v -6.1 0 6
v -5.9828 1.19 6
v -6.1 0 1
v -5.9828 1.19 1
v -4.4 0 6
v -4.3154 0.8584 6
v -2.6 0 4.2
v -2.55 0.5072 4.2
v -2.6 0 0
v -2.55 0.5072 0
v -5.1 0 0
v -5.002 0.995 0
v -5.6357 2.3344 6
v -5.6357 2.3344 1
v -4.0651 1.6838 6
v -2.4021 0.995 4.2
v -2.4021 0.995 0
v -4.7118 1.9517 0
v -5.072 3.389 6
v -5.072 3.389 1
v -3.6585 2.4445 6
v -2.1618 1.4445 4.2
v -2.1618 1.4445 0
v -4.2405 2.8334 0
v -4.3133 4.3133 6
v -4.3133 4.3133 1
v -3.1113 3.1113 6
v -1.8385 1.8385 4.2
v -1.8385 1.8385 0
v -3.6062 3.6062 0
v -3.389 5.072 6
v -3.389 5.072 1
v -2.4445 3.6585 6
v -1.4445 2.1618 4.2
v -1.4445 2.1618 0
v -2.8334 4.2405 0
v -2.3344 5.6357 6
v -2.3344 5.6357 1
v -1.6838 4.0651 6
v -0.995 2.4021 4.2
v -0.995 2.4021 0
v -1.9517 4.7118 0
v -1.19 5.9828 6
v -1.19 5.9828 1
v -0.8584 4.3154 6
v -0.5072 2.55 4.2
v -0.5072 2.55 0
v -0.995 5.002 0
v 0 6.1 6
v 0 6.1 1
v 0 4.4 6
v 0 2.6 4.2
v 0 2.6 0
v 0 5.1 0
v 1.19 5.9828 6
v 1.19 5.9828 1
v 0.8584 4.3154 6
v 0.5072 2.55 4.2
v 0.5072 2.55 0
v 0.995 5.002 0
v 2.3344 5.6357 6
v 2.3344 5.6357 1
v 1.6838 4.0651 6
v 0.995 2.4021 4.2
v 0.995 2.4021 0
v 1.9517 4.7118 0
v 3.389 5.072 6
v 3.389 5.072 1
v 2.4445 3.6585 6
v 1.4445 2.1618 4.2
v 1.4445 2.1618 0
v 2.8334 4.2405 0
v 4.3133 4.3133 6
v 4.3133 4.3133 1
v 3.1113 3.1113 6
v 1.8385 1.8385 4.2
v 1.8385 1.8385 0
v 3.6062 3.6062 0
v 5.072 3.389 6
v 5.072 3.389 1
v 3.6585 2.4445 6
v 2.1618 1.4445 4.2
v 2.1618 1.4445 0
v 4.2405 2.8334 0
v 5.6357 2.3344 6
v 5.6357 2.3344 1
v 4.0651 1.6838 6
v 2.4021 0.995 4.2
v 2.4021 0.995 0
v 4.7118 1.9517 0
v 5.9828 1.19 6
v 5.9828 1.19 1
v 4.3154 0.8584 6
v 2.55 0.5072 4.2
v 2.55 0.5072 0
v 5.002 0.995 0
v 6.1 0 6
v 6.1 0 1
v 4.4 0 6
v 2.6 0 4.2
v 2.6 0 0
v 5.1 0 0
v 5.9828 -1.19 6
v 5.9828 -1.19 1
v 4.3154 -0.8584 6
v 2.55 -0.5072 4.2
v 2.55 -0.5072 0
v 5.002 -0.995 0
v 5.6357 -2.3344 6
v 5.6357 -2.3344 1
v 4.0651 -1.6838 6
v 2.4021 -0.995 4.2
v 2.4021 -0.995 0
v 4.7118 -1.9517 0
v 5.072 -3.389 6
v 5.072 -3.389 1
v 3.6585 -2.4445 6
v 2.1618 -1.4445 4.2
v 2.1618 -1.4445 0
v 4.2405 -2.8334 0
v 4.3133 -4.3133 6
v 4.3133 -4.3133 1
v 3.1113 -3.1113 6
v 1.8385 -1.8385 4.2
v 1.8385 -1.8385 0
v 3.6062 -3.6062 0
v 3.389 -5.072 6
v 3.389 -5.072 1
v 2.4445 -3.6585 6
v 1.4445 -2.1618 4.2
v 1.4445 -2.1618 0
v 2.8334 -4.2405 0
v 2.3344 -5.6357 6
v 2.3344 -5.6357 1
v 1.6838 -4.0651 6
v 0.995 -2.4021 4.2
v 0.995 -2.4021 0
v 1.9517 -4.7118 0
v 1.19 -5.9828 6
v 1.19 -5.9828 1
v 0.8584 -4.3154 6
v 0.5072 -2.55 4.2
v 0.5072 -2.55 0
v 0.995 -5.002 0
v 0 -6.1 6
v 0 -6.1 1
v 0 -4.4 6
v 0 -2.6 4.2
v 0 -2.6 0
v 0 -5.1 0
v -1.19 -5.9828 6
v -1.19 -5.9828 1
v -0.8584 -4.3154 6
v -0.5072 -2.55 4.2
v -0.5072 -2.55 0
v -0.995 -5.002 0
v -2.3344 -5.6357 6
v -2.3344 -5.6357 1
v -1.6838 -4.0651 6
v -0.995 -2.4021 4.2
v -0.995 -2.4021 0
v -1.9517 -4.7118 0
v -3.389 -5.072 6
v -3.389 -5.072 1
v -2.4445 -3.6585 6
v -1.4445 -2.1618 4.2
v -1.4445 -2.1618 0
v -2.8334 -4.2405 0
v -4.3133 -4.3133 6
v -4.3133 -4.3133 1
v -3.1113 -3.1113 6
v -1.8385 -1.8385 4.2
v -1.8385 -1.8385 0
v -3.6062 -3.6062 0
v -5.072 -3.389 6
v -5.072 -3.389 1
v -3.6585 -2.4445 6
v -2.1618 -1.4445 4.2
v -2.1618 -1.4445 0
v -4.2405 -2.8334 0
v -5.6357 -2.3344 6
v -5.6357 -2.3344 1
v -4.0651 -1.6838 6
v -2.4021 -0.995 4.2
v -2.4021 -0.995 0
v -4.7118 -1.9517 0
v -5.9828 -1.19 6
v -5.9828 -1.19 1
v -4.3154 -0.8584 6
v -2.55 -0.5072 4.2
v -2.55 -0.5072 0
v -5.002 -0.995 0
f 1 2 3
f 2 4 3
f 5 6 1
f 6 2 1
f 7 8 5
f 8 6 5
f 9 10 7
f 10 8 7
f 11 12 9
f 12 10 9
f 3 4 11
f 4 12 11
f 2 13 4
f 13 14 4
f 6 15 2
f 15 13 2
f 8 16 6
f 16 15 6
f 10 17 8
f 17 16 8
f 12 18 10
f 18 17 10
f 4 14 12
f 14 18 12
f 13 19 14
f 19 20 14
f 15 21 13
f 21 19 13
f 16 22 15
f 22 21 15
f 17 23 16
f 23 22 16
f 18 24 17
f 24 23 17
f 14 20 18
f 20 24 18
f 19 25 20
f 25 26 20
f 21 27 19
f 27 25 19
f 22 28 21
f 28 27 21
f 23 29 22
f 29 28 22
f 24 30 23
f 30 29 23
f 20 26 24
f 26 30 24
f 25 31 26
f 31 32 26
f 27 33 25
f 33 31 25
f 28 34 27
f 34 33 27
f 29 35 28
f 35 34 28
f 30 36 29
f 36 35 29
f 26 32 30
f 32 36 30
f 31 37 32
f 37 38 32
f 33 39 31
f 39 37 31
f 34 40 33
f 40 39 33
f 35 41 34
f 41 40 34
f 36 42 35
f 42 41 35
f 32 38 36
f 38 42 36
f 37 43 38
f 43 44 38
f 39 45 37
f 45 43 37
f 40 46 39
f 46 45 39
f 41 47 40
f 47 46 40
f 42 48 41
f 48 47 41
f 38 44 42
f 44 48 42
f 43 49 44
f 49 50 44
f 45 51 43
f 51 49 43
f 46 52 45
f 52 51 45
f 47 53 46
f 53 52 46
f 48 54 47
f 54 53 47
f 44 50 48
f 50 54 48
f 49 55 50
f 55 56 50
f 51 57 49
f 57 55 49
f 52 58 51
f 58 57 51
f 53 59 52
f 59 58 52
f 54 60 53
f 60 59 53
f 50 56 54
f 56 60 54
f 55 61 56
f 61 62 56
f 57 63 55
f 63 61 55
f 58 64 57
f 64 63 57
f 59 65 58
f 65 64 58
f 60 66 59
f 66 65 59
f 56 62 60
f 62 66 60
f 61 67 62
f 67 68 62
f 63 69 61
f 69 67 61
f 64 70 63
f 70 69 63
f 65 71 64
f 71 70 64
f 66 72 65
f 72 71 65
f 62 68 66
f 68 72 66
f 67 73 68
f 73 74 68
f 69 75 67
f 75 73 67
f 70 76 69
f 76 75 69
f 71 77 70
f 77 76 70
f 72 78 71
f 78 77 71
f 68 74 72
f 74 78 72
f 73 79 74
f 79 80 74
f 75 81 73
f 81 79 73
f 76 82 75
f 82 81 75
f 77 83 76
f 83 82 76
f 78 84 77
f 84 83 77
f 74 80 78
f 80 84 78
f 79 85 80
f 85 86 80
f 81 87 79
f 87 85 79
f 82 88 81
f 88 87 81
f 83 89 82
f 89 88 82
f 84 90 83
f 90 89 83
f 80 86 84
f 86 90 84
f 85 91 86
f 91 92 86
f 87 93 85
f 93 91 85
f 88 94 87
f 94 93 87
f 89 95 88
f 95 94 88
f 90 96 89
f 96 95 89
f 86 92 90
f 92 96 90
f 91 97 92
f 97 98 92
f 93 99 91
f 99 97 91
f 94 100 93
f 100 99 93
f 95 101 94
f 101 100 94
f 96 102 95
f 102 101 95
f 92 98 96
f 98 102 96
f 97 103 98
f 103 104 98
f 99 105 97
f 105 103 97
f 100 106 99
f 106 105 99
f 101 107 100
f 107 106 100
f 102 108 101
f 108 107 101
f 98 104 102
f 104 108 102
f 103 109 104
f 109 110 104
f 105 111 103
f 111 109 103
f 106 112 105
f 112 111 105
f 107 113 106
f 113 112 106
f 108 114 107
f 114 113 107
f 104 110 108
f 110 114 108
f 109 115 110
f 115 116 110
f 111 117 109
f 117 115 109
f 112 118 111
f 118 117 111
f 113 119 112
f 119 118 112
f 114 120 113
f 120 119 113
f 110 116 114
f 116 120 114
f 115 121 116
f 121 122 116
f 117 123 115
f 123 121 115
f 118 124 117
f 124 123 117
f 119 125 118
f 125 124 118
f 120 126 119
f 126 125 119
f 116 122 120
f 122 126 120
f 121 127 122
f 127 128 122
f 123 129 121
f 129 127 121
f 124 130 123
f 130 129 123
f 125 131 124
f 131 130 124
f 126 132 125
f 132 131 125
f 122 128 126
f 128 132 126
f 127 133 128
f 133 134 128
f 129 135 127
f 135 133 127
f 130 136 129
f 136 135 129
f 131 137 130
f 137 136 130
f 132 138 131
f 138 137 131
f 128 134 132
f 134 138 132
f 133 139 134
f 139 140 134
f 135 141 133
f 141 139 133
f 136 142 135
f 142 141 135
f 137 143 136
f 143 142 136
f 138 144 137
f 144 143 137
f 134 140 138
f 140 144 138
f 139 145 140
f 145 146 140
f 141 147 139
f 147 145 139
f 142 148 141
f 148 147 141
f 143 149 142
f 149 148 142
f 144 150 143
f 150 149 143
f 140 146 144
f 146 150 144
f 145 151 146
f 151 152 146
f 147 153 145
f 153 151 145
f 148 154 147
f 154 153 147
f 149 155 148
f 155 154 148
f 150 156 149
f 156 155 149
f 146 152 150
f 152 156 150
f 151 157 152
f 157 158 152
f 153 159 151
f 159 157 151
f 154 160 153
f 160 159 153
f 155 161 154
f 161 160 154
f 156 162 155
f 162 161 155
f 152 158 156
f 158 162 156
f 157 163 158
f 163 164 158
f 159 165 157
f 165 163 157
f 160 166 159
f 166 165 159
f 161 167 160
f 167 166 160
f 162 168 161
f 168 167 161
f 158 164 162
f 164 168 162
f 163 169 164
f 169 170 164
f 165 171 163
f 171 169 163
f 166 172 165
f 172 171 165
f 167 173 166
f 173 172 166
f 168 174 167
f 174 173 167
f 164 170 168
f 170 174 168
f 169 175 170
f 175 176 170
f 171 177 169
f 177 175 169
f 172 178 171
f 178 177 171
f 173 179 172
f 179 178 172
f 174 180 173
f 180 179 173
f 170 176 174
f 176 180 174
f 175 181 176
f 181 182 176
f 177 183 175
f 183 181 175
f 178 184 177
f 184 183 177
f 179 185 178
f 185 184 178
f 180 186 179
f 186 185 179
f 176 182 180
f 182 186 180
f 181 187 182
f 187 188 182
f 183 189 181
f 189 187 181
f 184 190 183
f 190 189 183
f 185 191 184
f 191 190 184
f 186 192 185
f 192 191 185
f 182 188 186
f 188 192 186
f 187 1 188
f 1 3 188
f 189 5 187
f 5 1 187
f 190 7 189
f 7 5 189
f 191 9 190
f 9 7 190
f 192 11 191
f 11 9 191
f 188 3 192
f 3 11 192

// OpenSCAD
$fn = 32;

// ----------------------------------------------------------------------
// Form washer: countersunk washer, 12.2 mm outside, 5.2 mm bore
// ----------------------------------------------------------------------

// --- parameters (mm) ---
revolve_angle = 360;      // full turn around the Z axis
profile_points = 6;       // points of the closed outline

profile = [[2.6, 0], [5.1, 0], [6.1, 1], [6.1, 6], [4.4, 6], [2.6, 4.2]];  // single closed polygon, 6 points, counter clockwise

// --- the one profile operation ---
rotate_extrude(angle = revolve_angle) polygon(points = profile);
